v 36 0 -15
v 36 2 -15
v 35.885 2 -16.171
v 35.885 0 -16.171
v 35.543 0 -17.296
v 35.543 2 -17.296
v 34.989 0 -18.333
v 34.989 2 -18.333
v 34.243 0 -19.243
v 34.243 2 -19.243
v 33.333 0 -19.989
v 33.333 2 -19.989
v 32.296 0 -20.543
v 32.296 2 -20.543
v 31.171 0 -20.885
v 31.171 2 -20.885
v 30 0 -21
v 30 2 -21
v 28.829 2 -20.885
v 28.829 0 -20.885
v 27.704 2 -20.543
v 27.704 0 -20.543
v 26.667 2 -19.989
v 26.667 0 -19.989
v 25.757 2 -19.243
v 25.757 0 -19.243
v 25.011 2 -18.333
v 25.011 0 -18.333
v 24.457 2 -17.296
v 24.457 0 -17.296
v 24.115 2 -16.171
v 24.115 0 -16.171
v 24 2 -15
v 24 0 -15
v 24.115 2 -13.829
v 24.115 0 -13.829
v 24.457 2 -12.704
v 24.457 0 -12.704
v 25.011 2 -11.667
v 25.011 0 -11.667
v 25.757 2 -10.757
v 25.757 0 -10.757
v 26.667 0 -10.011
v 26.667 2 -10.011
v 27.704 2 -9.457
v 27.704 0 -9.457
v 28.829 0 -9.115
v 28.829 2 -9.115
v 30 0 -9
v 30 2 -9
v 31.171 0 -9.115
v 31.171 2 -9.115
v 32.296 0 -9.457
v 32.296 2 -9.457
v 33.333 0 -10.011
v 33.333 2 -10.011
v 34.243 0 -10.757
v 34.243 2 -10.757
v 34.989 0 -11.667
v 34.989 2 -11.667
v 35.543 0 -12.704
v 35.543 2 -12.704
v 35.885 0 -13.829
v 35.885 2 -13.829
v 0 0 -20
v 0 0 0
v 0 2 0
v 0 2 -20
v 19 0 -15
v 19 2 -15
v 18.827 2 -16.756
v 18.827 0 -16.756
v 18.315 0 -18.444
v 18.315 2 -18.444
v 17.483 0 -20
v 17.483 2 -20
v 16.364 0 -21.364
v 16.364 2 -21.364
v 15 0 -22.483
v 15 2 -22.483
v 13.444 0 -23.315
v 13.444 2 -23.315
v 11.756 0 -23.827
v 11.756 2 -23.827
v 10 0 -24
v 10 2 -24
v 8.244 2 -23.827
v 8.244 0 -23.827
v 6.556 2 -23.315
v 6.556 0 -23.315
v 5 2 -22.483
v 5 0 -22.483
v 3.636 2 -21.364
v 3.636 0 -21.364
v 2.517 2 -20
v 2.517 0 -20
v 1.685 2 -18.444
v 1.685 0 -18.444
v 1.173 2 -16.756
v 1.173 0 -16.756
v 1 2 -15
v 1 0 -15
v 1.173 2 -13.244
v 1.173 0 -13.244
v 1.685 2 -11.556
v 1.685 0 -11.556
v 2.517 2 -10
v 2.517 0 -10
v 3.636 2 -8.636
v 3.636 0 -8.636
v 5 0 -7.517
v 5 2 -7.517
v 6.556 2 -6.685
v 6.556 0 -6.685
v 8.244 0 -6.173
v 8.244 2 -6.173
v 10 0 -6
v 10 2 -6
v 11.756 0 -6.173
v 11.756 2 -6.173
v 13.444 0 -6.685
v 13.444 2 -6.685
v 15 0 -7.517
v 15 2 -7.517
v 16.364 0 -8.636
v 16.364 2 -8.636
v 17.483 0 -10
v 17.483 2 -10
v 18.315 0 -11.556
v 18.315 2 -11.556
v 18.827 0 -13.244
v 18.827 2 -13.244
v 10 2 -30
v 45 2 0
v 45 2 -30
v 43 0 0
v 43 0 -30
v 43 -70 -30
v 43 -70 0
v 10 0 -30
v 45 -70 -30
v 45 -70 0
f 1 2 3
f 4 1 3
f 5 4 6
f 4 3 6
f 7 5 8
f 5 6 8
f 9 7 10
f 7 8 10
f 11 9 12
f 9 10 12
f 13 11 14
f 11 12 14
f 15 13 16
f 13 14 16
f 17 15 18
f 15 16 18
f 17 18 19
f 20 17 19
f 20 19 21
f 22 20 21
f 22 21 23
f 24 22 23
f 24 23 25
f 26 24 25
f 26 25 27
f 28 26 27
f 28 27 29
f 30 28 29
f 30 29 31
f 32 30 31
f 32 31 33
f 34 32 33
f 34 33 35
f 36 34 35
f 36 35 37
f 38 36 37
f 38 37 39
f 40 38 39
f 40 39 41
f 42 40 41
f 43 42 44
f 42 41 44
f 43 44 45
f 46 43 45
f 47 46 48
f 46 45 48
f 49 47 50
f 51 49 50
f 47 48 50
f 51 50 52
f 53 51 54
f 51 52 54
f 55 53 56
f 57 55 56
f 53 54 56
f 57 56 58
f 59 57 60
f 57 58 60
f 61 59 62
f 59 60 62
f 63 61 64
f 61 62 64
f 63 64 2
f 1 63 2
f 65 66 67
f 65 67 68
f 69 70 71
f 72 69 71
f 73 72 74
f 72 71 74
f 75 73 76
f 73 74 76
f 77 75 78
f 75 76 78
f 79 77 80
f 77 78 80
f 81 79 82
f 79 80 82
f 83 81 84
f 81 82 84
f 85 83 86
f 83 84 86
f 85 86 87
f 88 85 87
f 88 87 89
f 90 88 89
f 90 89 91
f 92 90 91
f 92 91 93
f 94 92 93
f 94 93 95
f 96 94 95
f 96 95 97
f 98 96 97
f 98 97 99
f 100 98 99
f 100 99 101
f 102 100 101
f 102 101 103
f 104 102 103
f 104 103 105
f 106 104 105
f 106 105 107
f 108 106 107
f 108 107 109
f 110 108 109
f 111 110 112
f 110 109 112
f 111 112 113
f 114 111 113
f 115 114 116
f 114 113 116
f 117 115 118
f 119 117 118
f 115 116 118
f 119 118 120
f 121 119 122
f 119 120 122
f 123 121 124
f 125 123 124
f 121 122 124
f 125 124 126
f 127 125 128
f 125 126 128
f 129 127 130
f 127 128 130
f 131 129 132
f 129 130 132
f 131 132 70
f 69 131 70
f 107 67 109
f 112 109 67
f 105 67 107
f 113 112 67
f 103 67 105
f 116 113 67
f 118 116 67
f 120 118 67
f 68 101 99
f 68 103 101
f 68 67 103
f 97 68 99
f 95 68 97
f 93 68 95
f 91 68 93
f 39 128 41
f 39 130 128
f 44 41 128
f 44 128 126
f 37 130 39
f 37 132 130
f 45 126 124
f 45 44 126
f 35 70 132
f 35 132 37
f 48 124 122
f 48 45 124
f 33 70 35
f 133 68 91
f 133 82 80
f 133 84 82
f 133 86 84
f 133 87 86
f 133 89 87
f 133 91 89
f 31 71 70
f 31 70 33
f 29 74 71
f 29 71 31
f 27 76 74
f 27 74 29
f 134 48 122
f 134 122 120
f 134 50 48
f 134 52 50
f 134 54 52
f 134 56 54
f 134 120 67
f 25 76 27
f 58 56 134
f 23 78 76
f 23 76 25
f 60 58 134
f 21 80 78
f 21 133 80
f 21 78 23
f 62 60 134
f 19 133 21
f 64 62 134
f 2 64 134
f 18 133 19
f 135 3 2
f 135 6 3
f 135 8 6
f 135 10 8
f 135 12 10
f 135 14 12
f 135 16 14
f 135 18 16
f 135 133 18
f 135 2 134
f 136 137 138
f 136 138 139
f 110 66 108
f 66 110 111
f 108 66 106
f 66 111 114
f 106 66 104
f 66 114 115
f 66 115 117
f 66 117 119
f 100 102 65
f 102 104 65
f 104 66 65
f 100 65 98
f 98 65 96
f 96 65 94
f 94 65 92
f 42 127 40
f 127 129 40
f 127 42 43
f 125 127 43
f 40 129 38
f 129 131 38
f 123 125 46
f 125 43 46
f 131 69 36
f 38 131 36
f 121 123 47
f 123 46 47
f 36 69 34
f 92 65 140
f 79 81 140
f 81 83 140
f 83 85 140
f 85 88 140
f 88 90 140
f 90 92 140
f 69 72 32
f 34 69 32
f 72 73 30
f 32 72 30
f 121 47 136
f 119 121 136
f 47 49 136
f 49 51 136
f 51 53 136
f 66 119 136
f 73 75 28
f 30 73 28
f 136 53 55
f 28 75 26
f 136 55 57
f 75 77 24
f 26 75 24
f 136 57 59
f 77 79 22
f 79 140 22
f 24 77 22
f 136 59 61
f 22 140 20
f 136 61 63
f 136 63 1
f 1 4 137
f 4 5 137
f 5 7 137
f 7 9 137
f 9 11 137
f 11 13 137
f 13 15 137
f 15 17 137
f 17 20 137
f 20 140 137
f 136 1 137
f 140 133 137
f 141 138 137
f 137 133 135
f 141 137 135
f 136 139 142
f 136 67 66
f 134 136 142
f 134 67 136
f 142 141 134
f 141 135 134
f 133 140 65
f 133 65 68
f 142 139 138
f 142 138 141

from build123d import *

# Parameters (mm, degrees)
SKETCH1_W           = 45
SKETCH1_H           = 30
BOSS_EXTRUDE1_DEPTH = 2
SKETCH2_R           = 9
SKETCH2_R_2         = 6
CUT_EXTRUDE1_DEPTH  = 20
SKETCH3_W           = 2
SKETCH3_H           = 30
BOSS_EXTRUDE2_DEPTH = 70
CHAMFER1_SIZE       = 10


with BuildPart() as part:
    # Sketch1 → Boss-Extrude1 (new body)
    with BuildSketch(Plane(origin=(0, 0, 0), x_dir=(1, 0, 0), z_dir=(0, 1, 0))):
        with Locations((22.5, 15)):
            Rectangle(SKETCH1_W, SKETCH1_H)
    extrude(amount=BOSS_EXTRUDE1_DEPTH)

    # Sketch2 → Cut-Extrude1 (cut)
    with BuildSketch(Plane(origin=(0, 2, 0), x_dir=(1, 0, 0), z_dir=(0, 1, 0))):
        with Locations((10, 15)):
            Circle(SKETCH2_R)
        with Locations((30, 15)):
            Circle(SKETCH2_R_2)
    extrude(amount=-CUT_EXTRUDE1_DEPTH, mode=Mode.SUBTRACT)

    # Sketch3 → Boss-Extrude2 (add)
    with BuildSketch(Plane.XZ):
        with Locations((44, -15)):
            Rectangle(SKETCH3_W, SKETCH3_H)
    extrude(amount=BOSS_EXTRUDE2_DEPTH)

    # Chamfer1
    chamfer1_edges = [part.edges().sort_by_distance(p)[0] for p in [
        (0, 1, -30),
    ]]
    chamfer(chamfer1_edges, length=CHAMFER1_SIZE)


solid = part.part
